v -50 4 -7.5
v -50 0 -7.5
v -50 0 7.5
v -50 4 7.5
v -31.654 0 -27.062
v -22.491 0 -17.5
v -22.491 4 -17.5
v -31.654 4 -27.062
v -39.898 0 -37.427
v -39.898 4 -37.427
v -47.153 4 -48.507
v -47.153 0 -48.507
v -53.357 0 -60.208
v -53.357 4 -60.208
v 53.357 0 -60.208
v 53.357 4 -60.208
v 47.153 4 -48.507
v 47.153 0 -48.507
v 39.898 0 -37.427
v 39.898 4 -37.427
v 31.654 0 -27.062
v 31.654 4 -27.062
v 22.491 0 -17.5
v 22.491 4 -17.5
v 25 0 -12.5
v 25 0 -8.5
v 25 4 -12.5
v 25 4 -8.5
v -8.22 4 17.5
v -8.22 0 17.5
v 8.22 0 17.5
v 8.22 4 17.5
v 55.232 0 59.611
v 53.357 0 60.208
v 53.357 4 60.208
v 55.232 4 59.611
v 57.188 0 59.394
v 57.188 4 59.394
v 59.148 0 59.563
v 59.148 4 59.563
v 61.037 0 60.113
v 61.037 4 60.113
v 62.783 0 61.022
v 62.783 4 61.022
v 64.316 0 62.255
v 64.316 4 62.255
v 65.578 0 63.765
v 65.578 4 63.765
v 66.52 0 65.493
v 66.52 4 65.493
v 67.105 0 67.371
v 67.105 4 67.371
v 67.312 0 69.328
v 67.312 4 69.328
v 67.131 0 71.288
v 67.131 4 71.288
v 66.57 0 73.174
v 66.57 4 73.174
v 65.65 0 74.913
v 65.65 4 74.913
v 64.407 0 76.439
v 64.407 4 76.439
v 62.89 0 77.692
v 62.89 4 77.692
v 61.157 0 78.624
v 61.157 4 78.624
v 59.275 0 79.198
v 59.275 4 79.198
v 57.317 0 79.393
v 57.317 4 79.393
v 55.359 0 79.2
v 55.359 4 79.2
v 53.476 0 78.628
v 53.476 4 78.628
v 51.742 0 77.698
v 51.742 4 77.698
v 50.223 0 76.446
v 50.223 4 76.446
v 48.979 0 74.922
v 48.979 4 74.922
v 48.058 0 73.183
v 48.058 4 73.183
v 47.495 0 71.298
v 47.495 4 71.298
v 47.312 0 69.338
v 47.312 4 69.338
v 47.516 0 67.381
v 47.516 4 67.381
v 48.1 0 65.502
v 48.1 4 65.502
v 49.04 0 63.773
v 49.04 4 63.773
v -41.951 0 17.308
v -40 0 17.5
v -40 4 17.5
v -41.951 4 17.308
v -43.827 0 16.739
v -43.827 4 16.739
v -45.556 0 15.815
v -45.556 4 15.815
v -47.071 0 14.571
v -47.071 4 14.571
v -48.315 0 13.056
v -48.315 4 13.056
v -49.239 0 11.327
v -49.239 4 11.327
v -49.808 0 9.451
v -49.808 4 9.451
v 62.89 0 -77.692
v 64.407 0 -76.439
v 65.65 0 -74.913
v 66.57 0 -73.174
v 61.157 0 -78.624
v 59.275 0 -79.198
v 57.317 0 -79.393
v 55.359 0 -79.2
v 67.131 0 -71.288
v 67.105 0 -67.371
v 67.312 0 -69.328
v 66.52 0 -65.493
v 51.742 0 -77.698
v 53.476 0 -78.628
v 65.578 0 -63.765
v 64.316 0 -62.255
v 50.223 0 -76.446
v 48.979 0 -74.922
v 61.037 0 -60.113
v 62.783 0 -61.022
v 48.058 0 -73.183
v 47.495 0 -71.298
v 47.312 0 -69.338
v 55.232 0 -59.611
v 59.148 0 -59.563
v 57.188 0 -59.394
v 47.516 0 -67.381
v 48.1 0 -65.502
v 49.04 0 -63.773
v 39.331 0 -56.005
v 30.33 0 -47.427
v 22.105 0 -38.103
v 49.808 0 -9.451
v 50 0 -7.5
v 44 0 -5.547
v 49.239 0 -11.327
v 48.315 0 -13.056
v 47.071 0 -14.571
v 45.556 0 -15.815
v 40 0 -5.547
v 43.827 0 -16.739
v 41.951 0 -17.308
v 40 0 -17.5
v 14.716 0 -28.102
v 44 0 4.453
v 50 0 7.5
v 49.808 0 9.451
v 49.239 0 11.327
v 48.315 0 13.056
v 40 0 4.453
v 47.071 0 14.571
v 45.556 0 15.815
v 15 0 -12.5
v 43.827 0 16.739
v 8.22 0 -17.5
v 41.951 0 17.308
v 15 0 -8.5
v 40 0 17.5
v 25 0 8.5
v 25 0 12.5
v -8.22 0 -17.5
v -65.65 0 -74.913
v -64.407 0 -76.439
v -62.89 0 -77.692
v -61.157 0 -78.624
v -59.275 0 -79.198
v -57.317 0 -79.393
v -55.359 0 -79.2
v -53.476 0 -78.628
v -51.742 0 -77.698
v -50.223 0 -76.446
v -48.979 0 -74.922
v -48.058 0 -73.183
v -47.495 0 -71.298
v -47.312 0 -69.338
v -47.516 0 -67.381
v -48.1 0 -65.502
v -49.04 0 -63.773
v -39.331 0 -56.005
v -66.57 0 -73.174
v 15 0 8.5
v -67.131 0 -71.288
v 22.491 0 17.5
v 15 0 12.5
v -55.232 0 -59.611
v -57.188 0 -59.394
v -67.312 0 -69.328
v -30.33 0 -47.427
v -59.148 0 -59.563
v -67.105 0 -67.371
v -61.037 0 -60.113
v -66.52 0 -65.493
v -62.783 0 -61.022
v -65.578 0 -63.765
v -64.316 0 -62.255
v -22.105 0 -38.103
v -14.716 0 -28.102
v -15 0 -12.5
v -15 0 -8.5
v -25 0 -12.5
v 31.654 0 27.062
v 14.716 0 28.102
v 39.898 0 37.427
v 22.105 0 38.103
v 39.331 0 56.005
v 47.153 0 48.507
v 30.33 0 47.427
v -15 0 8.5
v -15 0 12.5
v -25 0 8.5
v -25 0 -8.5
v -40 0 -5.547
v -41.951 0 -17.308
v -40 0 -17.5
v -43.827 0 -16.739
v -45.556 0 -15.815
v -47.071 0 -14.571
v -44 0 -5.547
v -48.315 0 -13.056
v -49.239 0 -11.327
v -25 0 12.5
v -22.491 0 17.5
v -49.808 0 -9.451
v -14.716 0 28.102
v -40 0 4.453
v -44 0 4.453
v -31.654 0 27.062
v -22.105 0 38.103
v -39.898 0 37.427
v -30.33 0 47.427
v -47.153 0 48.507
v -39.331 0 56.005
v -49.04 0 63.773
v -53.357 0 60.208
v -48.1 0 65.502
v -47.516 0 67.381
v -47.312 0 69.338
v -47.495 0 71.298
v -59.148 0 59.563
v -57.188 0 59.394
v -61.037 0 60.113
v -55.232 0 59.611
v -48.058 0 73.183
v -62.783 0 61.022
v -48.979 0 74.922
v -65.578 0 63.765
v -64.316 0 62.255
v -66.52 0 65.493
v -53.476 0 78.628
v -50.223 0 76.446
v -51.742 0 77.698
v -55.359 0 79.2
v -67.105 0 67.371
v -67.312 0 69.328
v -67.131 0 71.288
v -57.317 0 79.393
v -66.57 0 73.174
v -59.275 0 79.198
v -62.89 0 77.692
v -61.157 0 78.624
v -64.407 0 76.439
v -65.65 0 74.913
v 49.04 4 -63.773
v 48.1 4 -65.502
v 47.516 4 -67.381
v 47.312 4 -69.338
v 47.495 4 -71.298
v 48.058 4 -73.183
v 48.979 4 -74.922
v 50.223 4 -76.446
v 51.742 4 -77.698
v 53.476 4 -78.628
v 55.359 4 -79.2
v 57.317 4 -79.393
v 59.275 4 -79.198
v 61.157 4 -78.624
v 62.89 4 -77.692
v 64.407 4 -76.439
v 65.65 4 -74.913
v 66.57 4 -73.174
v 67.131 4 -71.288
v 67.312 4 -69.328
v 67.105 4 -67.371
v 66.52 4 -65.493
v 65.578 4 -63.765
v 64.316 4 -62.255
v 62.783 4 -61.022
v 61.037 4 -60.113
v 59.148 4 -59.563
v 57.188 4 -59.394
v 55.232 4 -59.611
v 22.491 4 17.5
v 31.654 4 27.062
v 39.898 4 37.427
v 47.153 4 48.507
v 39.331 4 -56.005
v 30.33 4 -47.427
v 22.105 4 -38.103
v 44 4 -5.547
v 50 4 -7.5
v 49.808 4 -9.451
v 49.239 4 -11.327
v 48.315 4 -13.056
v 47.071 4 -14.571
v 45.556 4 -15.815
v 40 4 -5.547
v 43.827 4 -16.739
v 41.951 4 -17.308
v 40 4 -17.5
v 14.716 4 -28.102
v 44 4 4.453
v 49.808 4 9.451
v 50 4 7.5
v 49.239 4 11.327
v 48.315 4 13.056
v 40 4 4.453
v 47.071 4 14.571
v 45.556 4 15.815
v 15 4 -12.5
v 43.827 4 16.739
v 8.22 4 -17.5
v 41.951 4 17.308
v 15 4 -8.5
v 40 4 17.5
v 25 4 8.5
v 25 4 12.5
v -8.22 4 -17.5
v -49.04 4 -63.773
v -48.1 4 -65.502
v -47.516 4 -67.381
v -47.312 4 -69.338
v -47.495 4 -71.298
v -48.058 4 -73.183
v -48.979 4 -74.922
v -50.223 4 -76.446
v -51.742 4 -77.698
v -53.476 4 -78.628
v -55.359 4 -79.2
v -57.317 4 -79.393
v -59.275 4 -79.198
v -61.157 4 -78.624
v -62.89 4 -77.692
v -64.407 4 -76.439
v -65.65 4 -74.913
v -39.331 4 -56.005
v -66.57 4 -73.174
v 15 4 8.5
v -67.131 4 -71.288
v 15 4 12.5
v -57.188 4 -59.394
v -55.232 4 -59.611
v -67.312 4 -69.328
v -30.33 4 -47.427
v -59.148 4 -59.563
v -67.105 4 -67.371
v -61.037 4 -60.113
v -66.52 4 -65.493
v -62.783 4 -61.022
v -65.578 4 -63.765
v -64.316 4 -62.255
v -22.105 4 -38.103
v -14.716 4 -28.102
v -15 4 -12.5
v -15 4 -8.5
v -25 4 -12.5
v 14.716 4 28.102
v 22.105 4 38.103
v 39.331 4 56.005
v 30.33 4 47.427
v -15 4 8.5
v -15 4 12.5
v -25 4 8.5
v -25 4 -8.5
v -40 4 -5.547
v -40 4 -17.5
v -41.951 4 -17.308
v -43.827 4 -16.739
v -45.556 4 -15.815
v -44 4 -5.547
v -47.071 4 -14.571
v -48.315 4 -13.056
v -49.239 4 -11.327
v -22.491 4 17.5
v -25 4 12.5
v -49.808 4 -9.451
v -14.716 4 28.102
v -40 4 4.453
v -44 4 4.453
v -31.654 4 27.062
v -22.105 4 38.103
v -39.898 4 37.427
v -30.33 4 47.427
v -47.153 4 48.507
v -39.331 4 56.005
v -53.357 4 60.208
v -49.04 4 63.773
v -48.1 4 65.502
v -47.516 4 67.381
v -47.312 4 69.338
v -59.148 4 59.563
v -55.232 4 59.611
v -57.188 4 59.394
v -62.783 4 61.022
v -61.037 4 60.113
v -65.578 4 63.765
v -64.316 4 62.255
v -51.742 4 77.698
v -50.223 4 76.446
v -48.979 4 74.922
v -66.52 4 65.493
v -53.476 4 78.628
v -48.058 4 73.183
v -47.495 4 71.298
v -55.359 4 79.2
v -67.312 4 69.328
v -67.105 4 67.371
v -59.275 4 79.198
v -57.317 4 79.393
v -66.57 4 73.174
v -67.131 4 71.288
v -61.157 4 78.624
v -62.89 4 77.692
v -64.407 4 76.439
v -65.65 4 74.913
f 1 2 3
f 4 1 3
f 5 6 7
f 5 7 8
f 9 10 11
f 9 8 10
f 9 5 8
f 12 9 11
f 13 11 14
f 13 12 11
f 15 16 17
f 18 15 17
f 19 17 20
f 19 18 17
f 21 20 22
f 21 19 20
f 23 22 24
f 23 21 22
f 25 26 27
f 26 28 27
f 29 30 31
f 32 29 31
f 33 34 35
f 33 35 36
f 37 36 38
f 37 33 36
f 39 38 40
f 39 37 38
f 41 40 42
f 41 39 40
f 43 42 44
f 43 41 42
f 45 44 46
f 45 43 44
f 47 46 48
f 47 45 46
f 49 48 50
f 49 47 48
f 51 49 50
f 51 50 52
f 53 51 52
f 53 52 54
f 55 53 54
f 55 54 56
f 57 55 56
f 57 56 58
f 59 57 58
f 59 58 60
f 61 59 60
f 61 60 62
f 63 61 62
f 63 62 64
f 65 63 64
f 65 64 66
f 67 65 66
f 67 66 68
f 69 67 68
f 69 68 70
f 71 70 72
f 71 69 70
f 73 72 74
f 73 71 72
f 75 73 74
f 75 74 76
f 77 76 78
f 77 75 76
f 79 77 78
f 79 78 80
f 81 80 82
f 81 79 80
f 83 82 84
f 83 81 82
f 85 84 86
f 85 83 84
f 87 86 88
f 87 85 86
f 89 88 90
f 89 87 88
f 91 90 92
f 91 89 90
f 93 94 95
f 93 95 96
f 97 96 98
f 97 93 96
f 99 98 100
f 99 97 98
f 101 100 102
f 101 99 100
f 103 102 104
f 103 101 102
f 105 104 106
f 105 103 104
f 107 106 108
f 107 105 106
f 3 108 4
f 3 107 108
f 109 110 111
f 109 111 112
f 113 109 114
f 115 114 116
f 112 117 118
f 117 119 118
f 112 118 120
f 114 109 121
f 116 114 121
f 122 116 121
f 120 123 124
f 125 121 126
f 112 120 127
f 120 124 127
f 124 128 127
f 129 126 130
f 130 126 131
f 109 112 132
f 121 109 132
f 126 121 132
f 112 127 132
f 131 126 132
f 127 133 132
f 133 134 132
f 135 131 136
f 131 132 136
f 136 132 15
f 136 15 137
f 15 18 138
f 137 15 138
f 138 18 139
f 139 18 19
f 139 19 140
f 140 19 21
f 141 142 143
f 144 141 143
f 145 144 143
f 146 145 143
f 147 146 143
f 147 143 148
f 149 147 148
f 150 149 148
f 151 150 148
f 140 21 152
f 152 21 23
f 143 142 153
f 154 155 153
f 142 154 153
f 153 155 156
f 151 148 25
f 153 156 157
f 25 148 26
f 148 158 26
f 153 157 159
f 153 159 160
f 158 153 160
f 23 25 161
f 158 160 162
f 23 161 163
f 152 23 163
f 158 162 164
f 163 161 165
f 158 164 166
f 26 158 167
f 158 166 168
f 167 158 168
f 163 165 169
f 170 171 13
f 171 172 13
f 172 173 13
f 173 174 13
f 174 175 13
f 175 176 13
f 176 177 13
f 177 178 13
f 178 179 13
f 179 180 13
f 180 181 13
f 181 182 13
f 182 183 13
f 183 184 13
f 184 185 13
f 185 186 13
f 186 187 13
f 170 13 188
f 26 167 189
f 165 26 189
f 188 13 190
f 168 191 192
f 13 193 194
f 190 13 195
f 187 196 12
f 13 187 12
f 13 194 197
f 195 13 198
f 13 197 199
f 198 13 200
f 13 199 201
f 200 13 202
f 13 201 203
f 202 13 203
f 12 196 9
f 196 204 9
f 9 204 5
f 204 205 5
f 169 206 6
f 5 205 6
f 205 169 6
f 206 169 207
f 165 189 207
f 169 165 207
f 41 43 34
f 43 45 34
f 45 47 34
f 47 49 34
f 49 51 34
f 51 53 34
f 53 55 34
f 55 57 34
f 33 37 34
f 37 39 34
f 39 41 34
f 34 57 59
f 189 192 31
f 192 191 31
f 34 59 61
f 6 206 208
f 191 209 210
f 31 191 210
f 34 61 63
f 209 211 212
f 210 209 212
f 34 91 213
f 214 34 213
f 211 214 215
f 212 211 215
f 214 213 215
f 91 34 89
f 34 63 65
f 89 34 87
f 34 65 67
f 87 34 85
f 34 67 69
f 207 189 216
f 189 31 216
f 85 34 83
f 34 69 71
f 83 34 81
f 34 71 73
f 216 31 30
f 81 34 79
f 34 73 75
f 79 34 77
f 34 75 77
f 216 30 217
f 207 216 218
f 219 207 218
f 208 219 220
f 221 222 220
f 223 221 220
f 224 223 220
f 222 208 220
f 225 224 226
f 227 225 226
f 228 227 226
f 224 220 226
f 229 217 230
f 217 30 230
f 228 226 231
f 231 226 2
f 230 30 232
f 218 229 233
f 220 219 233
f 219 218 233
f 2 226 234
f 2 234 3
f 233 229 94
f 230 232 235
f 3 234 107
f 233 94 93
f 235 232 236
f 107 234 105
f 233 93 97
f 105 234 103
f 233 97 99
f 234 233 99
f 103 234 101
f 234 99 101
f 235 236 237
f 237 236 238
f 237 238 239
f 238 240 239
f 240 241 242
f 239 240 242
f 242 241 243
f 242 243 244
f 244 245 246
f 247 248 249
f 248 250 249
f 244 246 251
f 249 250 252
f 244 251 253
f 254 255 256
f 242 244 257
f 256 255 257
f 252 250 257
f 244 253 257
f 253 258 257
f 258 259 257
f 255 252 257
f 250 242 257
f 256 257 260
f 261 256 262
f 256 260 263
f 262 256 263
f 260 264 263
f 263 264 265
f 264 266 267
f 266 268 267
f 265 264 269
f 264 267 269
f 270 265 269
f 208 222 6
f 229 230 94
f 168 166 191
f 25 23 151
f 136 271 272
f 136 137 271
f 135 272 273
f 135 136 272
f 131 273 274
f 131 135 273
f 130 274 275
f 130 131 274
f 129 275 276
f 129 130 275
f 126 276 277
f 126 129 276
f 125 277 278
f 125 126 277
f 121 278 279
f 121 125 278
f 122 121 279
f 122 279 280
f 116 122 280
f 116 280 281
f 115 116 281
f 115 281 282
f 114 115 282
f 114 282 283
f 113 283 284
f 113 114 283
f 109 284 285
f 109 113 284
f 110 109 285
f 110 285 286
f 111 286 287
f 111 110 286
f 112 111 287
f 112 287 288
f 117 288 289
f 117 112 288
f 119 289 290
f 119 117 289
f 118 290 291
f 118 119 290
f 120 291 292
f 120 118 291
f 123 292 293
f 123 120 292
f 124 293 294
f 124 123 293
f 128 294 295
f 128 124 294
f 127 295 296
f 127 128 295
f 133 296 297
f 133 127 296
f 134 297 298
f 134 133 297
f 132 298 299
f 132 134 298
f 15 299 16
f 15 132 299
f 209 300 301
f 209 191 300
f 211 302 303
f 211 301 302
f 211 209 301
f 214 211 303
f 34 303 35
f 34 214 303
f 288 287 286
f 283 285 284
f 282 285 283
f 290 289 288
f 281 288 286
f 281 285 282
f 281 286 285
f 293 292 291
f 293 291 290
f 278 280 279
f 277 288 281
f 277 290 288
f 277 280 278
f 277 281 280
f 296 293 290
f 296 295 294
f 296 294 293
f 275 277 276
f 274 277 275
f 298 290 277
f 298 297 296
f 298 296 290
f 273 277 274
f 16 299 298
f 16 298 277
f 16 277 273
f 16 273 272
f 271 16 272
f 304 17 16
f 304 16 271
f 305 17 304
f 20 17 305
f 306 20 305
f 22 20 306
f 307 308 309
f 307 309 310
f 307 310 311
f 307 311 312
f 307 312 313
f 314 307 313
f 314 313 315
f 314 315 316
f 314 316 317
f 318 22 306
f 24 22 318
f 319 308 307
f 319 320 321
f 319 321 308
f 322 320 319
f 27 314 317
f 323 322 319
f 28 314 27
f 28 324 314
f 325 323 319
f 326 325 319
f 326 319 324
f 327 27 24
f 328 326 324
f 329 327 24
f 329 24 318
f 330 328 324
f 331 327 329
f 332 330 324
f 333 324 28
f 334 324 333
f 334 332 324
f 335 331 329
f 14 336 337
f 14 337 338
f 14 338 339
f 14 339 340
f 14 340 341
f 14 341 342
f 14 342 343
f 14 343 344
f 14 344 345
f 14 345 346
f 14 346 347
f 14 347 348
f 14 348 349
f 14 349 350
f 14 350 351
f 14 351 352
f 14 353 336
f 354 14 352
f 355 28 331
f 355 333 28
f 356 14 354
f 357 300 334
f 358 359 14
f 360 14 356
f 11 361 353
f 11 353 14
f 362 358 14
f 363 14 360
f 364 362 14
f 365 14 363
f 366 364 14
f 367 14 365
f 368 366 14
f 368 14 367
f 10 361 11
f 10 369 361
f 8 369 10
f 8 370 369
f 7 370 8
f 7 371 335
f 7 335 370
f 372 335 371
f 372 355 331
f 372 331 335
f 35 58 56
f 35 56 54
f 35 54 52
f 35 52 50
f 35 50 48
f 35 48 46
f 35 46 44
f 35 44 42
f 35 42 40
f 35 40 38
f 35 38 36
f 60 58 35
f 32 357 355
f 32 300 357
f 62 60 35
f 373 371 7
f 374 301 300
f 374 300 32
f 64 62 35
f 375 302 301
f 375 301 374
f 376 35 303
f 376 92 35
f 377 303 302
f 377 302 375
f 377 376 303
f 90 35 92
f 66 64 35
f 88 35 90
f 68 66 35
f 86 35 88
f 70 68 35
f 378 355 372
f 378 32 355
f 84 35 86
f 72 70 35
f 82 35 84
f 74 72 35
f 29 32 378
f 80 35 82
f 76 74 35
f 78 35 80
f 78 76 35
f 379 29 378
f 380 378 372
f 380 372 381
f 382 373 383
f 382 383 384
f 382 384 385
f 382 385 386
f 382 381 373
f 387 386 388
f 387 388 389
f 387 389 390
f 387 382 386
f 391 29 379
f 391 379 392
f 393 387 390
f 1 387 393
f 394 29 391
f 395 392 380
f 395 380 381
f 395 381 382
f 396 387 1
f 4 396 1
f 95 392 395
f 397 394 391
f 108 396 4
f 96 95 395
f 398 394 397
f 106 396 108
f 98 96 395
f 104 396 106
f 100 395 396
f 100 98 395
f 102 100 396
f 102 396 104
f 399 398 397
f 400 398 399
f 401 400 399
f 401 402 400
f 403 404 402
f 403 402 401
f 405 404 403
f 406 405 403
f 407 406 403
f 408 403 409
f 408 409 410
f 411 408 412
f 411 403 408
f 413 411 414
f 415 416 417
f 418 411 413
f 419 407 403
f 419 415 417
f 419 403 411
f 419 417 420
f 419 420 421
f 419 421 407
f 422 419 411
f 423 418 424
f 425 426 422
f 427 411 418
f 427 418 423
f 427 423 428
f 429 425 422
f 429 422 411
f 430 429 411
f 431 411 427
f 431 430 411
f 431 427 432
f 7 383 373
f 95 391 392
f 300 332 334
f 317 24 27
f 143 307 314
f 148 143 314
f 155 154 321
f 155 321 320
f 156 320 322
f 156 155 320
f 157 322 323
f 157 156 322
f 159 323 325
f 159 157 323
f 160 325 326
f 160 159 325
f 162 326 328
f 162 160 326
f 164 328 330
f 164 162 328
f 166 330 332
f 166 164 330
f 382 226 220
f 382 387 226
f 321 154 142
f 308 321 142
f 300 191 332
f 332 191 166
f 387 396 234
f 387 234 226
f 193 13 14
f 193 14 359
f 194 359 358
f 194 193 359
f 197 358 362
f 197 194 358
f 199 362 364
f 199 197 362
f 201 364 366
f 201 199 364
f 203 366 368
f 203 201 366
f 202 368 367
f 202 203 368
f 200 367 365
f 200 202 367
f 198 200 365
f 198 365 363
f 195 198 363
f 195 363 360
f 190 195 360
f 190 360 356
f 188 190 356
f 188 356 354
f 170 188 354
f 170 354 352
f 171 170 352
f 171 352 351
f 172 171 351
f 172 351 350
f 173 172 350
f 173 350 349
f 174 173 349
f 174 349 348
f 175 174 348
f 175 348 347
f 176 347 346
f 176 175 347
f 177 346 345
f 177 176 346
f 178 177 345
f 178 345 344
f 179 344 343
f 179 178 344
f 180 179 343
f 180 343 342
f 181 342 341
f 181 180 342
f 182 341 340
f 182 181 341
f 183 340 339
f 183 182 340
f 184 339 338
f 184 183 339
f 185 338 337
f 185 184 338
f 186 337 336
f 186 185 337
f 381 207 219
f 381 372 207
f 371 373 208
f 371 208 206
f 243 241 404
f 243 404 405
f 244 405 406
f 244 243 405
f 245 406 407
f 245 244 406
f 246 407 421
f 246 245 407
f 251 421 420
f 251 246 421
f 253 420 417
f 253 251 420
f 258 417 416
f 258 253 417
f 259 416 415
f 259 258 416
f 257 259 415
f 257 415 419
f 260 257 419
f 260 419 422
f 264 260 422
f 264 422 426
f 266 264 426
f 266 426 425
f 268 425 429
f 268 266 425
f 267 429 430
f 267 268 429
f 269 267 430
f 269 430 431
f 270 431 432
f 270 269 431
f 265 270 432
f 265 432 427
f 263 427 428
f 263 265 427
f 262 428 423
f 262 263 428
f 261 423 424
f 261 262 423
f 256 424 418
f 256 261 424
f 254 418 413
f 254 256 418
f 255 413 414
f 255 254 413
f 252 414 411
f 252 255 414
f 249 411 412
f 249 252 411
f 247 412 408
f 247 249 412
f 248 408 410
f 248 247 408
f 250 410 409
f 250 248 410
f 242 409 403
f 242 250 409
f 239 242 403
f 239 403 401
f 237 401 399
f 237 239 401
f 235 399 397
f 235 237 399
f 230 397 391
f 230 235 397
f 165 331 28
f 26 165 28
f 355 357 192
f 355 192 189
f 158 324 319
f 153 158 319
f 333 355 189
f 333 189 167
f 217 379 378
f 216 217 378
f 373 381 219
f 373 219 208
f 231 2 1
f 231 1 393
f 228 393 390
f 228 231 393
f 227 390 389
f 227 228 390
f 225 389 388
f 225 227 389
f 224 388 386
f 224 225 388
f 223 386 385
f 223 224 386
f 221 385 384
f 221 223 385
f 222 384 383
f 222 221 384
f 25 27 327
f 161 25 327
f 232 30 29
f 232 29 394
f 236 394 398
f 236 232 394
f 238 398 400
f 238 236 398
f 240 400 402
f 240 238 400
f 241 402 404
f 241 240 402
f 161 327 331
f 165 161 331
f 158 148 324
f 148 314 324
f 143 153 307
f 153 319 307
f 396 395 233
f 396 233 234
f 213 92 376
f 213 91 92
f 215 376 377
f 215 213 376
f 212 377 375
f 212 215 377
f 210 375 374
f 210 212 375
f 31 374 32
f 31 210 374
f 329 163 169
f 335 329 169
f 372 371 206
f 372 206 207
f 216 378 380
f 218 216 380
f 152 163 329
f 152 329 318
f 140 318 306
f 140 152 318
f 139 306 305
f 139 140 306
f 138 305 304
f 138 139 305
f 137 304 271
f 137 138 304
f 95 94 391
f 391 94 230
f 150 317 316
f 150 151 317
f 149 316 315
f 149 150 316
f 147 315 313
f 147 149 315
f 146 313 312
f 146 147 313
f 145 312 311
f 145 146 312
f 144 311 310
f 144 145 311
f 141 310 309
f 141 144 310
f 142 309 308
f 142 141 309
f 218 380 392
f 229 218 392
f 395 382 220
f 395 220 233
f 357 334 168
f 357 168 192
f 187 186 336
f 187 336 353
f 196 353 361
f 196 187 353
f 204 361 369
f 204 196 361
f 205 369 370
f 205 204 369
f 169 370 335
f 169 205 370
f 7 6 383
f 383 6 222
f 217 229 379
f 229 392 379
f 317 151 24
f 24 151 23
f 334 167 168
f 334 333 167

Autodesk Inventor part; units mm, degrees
ref_plane "YZ Plane" through (0, 0, 0) normal (1, 0, 0) x (0, 1, 0)
ref_plane "XZ Plane" through (0, 0, 0) normal (0, 1, 0) x (-1, 0, 0)
ref_plane "XY Plane" through (0, 0, 0) normal (0, 0, 1) x (1, 0, 0)
sketch "Эскиз1" plane through (0, 0, 0) normal (0, 1, 0) x (-1, 0, 0)
  line L0 (40, 17.5) -> (-40, 17.5)
  line L1 (-50, 7.5) -> (-50, -7.5)
  line L2 (-40, -17.5) -> (40, -17.5)
  line L3 (50, -7.5) -> (50, 7.5)
  line L4 (0, 0) -> (103.6754, 0) construction
  line L5 (0, 0) -> (0, -121.5896) construction
  line L6 (14.4533, -17.5) -> (50.9438, -61.6825)
  circle A0 centre (57.3118, -69.3928) radius 10
  arc A1 (53.3569, -60.2081) -> (22.4906, -17.5) centre (-76.5583, -121.5932) ccw
  line L7 (0, 0) -> (119.3987, -22.9778) construction
  arc A2 (8.22, -17.5) -> (49.04, -63.7734) centre (133.8701, 52.2004) ccw
  arc A3 (40, -17.5) -> (50, -7.5) centre (40, -7.5) ccw
  arc A4 (50, 7.5) -> (40, 17.5) centre (40, 7.5) ccw
  arc A5 (-40, 17.5) -> (-50, 7.5) centre (-40, 7.5) ccw
  arc A6 (-50, -7.5) -> (-40, -17.5) centre (-40, -7.5) ccw
  line L8 (-14.4533, -17.5) -> (-50.9438, -61.6825)
  circle A7 centre (-57.3118, -69.3928) radius 10
  arc A8 (-22.4906, -17.5) -> (-53.3569, -60.2081) centre (76.5583, -121.5932) ccw
  arc A9 (-49.04, -63.7734) -> (-8.22, -17.5) centre (-133.8701, 52.2004) ccw
  line L9 (0, 0) -> (0, 121.5896) construction
  line L10 (14.4533, 17.5) -> (50.9438, 61.6825)
  circle A10 centre (57.3118, 69.3928) radius 10
  arc A11 (22.4906, 17.5) -> (53.3569, 60.2081) centre (-76.5583, 121.5932) ccw
  arc A12 (49.04, 63.7734) -> (8.22, 17.5) centre (133.8701, -52.2004) ccw
  circle A13 centre (-57.3118, 69.3928) radius 10
  arc A14 (-53.3569, 60.2081) -> (-22.4906, 17.5) centre (76.5583, 121.5932) ccw
  line L11 (-14.4533, 17.5) -> (-50.9438, 61.6825)
  arc A15 (-8.22, 17.5) -> (-49.04, 63.7734) centre (-133.8701, -52.2004) ccw
  point P0 (50, 17.5)
  point P1 (-50, -17.5)
  point P2 (50, -17.5)
  point P3 (-22.4906, -17.5)
  point P4 (-8.22, -17.5)
  point P5 (22.4906, 17.5)
  point P6 (8.22, 17.5)
  point P7 (-8.22, 17.5)
  point P8 (-22.4906, 17.5)
  dimension "d0" = 35
  dimension "d1" = 100
  dimension "d2" = 50
  dimension "d3" = 35
  dimension "d4" = 17.5
  dimension "d5" = 80
  dimension "d6" = 20
  dimension "d7" = 10
  dimension "d8" = 10
extrude "Выдавливание1" add sketch "Эскиз1" along normal blind 4
sketch "Эскиз2" plane through (0, 4, 0) normal (0, 1, 0) x (1, 0, 0)
  line L0 (-25, -12.5) -> (-15, -12.5)
  line L1 (-15, -12.5) -> (-15, -8.5)
  line L2 (-15, -8.5) -> (-25, -8.5)
  line L3 (-25, -8.5) -> (-25, -12.5)
  line L4 (-50, 7.5) -> (-50, -7.5) projected
  line L5 (-40, -17.5) -> (-22.4906, -17.5) projected
  line L6 (0, 0) -> (-53.5692, 0) construction
  line L7 (0, 0) -> (0, -51.6418) construction
  line L8 (-25, 12.5) -> (-15, 12.5)
  line L9 (-15, 12.5) -> (-15, 8.5)
  line L10 (-15, 8.5) -> (-25, 8.5)
  line L11 (-25, 8.5) -> (-25, 12.5)
  line L12 (-40, 17.5) -> (-22.4906, 17.5)
  line L13 (0, 0) -> (0, 51.6418) construction
  line L14 (25, -12.5) -> (15, -12.5)
  line L15 (15, -12.5) -> (15, -8.5)
  line L16 (15, -8.5) -> (25, -8.5)
  line L17 (25, -8.5) -> (25, -12.5)
  line L18 (25, 12.5) -> (15, 12.5)
  line L19 (15, 12.5) -> (15, 8.5)
  line L20 (15, 8.5) -> (25, 8.5)
  line L21 (25, 8.5) -> (25, 12.5)
  dimension "d11" = 4
  dimension "d12" = 10
  dimension "d13" = 25
  dimension "d14" = 5
extrude "Выдавливание2" cut sketch "Эскиз2" against normal blind 4
sketch "Эскиз3" plane through (0, 4, 0) normal (0, 1, 0) x (1, 0, 0)
  line L0 (-40, -4.453) -> (-44, -4.453)
  line L1 (-44, -4.453) -> (-44, 5.547)
  line L2 (-44, 5.547) -> (-40, 5.547)
  line L3 (-40, 5.547) -> (-40, -4.453)
  line L4 (-50, 7.5) -> (-50, -7.5) projected
  line L5 (0, 0) -> (0, 42.0711) construction
  line L6 (40, -4.453) -> (44, -4.453)
  line L7 (44, -4.453) -> (44, 5.547)
  line L8 (44, 5.547) -> (40, 5.547)
  line L9 (40, 5.547) -> (40, -4.453)
  dimension "d17" = 10
  dimension "d18" = 4
  dimension "d19" = 10
extrude "Выдавливание3" cut sketch "Эскиз3" against normal blind 4
properties part number "Dron"
